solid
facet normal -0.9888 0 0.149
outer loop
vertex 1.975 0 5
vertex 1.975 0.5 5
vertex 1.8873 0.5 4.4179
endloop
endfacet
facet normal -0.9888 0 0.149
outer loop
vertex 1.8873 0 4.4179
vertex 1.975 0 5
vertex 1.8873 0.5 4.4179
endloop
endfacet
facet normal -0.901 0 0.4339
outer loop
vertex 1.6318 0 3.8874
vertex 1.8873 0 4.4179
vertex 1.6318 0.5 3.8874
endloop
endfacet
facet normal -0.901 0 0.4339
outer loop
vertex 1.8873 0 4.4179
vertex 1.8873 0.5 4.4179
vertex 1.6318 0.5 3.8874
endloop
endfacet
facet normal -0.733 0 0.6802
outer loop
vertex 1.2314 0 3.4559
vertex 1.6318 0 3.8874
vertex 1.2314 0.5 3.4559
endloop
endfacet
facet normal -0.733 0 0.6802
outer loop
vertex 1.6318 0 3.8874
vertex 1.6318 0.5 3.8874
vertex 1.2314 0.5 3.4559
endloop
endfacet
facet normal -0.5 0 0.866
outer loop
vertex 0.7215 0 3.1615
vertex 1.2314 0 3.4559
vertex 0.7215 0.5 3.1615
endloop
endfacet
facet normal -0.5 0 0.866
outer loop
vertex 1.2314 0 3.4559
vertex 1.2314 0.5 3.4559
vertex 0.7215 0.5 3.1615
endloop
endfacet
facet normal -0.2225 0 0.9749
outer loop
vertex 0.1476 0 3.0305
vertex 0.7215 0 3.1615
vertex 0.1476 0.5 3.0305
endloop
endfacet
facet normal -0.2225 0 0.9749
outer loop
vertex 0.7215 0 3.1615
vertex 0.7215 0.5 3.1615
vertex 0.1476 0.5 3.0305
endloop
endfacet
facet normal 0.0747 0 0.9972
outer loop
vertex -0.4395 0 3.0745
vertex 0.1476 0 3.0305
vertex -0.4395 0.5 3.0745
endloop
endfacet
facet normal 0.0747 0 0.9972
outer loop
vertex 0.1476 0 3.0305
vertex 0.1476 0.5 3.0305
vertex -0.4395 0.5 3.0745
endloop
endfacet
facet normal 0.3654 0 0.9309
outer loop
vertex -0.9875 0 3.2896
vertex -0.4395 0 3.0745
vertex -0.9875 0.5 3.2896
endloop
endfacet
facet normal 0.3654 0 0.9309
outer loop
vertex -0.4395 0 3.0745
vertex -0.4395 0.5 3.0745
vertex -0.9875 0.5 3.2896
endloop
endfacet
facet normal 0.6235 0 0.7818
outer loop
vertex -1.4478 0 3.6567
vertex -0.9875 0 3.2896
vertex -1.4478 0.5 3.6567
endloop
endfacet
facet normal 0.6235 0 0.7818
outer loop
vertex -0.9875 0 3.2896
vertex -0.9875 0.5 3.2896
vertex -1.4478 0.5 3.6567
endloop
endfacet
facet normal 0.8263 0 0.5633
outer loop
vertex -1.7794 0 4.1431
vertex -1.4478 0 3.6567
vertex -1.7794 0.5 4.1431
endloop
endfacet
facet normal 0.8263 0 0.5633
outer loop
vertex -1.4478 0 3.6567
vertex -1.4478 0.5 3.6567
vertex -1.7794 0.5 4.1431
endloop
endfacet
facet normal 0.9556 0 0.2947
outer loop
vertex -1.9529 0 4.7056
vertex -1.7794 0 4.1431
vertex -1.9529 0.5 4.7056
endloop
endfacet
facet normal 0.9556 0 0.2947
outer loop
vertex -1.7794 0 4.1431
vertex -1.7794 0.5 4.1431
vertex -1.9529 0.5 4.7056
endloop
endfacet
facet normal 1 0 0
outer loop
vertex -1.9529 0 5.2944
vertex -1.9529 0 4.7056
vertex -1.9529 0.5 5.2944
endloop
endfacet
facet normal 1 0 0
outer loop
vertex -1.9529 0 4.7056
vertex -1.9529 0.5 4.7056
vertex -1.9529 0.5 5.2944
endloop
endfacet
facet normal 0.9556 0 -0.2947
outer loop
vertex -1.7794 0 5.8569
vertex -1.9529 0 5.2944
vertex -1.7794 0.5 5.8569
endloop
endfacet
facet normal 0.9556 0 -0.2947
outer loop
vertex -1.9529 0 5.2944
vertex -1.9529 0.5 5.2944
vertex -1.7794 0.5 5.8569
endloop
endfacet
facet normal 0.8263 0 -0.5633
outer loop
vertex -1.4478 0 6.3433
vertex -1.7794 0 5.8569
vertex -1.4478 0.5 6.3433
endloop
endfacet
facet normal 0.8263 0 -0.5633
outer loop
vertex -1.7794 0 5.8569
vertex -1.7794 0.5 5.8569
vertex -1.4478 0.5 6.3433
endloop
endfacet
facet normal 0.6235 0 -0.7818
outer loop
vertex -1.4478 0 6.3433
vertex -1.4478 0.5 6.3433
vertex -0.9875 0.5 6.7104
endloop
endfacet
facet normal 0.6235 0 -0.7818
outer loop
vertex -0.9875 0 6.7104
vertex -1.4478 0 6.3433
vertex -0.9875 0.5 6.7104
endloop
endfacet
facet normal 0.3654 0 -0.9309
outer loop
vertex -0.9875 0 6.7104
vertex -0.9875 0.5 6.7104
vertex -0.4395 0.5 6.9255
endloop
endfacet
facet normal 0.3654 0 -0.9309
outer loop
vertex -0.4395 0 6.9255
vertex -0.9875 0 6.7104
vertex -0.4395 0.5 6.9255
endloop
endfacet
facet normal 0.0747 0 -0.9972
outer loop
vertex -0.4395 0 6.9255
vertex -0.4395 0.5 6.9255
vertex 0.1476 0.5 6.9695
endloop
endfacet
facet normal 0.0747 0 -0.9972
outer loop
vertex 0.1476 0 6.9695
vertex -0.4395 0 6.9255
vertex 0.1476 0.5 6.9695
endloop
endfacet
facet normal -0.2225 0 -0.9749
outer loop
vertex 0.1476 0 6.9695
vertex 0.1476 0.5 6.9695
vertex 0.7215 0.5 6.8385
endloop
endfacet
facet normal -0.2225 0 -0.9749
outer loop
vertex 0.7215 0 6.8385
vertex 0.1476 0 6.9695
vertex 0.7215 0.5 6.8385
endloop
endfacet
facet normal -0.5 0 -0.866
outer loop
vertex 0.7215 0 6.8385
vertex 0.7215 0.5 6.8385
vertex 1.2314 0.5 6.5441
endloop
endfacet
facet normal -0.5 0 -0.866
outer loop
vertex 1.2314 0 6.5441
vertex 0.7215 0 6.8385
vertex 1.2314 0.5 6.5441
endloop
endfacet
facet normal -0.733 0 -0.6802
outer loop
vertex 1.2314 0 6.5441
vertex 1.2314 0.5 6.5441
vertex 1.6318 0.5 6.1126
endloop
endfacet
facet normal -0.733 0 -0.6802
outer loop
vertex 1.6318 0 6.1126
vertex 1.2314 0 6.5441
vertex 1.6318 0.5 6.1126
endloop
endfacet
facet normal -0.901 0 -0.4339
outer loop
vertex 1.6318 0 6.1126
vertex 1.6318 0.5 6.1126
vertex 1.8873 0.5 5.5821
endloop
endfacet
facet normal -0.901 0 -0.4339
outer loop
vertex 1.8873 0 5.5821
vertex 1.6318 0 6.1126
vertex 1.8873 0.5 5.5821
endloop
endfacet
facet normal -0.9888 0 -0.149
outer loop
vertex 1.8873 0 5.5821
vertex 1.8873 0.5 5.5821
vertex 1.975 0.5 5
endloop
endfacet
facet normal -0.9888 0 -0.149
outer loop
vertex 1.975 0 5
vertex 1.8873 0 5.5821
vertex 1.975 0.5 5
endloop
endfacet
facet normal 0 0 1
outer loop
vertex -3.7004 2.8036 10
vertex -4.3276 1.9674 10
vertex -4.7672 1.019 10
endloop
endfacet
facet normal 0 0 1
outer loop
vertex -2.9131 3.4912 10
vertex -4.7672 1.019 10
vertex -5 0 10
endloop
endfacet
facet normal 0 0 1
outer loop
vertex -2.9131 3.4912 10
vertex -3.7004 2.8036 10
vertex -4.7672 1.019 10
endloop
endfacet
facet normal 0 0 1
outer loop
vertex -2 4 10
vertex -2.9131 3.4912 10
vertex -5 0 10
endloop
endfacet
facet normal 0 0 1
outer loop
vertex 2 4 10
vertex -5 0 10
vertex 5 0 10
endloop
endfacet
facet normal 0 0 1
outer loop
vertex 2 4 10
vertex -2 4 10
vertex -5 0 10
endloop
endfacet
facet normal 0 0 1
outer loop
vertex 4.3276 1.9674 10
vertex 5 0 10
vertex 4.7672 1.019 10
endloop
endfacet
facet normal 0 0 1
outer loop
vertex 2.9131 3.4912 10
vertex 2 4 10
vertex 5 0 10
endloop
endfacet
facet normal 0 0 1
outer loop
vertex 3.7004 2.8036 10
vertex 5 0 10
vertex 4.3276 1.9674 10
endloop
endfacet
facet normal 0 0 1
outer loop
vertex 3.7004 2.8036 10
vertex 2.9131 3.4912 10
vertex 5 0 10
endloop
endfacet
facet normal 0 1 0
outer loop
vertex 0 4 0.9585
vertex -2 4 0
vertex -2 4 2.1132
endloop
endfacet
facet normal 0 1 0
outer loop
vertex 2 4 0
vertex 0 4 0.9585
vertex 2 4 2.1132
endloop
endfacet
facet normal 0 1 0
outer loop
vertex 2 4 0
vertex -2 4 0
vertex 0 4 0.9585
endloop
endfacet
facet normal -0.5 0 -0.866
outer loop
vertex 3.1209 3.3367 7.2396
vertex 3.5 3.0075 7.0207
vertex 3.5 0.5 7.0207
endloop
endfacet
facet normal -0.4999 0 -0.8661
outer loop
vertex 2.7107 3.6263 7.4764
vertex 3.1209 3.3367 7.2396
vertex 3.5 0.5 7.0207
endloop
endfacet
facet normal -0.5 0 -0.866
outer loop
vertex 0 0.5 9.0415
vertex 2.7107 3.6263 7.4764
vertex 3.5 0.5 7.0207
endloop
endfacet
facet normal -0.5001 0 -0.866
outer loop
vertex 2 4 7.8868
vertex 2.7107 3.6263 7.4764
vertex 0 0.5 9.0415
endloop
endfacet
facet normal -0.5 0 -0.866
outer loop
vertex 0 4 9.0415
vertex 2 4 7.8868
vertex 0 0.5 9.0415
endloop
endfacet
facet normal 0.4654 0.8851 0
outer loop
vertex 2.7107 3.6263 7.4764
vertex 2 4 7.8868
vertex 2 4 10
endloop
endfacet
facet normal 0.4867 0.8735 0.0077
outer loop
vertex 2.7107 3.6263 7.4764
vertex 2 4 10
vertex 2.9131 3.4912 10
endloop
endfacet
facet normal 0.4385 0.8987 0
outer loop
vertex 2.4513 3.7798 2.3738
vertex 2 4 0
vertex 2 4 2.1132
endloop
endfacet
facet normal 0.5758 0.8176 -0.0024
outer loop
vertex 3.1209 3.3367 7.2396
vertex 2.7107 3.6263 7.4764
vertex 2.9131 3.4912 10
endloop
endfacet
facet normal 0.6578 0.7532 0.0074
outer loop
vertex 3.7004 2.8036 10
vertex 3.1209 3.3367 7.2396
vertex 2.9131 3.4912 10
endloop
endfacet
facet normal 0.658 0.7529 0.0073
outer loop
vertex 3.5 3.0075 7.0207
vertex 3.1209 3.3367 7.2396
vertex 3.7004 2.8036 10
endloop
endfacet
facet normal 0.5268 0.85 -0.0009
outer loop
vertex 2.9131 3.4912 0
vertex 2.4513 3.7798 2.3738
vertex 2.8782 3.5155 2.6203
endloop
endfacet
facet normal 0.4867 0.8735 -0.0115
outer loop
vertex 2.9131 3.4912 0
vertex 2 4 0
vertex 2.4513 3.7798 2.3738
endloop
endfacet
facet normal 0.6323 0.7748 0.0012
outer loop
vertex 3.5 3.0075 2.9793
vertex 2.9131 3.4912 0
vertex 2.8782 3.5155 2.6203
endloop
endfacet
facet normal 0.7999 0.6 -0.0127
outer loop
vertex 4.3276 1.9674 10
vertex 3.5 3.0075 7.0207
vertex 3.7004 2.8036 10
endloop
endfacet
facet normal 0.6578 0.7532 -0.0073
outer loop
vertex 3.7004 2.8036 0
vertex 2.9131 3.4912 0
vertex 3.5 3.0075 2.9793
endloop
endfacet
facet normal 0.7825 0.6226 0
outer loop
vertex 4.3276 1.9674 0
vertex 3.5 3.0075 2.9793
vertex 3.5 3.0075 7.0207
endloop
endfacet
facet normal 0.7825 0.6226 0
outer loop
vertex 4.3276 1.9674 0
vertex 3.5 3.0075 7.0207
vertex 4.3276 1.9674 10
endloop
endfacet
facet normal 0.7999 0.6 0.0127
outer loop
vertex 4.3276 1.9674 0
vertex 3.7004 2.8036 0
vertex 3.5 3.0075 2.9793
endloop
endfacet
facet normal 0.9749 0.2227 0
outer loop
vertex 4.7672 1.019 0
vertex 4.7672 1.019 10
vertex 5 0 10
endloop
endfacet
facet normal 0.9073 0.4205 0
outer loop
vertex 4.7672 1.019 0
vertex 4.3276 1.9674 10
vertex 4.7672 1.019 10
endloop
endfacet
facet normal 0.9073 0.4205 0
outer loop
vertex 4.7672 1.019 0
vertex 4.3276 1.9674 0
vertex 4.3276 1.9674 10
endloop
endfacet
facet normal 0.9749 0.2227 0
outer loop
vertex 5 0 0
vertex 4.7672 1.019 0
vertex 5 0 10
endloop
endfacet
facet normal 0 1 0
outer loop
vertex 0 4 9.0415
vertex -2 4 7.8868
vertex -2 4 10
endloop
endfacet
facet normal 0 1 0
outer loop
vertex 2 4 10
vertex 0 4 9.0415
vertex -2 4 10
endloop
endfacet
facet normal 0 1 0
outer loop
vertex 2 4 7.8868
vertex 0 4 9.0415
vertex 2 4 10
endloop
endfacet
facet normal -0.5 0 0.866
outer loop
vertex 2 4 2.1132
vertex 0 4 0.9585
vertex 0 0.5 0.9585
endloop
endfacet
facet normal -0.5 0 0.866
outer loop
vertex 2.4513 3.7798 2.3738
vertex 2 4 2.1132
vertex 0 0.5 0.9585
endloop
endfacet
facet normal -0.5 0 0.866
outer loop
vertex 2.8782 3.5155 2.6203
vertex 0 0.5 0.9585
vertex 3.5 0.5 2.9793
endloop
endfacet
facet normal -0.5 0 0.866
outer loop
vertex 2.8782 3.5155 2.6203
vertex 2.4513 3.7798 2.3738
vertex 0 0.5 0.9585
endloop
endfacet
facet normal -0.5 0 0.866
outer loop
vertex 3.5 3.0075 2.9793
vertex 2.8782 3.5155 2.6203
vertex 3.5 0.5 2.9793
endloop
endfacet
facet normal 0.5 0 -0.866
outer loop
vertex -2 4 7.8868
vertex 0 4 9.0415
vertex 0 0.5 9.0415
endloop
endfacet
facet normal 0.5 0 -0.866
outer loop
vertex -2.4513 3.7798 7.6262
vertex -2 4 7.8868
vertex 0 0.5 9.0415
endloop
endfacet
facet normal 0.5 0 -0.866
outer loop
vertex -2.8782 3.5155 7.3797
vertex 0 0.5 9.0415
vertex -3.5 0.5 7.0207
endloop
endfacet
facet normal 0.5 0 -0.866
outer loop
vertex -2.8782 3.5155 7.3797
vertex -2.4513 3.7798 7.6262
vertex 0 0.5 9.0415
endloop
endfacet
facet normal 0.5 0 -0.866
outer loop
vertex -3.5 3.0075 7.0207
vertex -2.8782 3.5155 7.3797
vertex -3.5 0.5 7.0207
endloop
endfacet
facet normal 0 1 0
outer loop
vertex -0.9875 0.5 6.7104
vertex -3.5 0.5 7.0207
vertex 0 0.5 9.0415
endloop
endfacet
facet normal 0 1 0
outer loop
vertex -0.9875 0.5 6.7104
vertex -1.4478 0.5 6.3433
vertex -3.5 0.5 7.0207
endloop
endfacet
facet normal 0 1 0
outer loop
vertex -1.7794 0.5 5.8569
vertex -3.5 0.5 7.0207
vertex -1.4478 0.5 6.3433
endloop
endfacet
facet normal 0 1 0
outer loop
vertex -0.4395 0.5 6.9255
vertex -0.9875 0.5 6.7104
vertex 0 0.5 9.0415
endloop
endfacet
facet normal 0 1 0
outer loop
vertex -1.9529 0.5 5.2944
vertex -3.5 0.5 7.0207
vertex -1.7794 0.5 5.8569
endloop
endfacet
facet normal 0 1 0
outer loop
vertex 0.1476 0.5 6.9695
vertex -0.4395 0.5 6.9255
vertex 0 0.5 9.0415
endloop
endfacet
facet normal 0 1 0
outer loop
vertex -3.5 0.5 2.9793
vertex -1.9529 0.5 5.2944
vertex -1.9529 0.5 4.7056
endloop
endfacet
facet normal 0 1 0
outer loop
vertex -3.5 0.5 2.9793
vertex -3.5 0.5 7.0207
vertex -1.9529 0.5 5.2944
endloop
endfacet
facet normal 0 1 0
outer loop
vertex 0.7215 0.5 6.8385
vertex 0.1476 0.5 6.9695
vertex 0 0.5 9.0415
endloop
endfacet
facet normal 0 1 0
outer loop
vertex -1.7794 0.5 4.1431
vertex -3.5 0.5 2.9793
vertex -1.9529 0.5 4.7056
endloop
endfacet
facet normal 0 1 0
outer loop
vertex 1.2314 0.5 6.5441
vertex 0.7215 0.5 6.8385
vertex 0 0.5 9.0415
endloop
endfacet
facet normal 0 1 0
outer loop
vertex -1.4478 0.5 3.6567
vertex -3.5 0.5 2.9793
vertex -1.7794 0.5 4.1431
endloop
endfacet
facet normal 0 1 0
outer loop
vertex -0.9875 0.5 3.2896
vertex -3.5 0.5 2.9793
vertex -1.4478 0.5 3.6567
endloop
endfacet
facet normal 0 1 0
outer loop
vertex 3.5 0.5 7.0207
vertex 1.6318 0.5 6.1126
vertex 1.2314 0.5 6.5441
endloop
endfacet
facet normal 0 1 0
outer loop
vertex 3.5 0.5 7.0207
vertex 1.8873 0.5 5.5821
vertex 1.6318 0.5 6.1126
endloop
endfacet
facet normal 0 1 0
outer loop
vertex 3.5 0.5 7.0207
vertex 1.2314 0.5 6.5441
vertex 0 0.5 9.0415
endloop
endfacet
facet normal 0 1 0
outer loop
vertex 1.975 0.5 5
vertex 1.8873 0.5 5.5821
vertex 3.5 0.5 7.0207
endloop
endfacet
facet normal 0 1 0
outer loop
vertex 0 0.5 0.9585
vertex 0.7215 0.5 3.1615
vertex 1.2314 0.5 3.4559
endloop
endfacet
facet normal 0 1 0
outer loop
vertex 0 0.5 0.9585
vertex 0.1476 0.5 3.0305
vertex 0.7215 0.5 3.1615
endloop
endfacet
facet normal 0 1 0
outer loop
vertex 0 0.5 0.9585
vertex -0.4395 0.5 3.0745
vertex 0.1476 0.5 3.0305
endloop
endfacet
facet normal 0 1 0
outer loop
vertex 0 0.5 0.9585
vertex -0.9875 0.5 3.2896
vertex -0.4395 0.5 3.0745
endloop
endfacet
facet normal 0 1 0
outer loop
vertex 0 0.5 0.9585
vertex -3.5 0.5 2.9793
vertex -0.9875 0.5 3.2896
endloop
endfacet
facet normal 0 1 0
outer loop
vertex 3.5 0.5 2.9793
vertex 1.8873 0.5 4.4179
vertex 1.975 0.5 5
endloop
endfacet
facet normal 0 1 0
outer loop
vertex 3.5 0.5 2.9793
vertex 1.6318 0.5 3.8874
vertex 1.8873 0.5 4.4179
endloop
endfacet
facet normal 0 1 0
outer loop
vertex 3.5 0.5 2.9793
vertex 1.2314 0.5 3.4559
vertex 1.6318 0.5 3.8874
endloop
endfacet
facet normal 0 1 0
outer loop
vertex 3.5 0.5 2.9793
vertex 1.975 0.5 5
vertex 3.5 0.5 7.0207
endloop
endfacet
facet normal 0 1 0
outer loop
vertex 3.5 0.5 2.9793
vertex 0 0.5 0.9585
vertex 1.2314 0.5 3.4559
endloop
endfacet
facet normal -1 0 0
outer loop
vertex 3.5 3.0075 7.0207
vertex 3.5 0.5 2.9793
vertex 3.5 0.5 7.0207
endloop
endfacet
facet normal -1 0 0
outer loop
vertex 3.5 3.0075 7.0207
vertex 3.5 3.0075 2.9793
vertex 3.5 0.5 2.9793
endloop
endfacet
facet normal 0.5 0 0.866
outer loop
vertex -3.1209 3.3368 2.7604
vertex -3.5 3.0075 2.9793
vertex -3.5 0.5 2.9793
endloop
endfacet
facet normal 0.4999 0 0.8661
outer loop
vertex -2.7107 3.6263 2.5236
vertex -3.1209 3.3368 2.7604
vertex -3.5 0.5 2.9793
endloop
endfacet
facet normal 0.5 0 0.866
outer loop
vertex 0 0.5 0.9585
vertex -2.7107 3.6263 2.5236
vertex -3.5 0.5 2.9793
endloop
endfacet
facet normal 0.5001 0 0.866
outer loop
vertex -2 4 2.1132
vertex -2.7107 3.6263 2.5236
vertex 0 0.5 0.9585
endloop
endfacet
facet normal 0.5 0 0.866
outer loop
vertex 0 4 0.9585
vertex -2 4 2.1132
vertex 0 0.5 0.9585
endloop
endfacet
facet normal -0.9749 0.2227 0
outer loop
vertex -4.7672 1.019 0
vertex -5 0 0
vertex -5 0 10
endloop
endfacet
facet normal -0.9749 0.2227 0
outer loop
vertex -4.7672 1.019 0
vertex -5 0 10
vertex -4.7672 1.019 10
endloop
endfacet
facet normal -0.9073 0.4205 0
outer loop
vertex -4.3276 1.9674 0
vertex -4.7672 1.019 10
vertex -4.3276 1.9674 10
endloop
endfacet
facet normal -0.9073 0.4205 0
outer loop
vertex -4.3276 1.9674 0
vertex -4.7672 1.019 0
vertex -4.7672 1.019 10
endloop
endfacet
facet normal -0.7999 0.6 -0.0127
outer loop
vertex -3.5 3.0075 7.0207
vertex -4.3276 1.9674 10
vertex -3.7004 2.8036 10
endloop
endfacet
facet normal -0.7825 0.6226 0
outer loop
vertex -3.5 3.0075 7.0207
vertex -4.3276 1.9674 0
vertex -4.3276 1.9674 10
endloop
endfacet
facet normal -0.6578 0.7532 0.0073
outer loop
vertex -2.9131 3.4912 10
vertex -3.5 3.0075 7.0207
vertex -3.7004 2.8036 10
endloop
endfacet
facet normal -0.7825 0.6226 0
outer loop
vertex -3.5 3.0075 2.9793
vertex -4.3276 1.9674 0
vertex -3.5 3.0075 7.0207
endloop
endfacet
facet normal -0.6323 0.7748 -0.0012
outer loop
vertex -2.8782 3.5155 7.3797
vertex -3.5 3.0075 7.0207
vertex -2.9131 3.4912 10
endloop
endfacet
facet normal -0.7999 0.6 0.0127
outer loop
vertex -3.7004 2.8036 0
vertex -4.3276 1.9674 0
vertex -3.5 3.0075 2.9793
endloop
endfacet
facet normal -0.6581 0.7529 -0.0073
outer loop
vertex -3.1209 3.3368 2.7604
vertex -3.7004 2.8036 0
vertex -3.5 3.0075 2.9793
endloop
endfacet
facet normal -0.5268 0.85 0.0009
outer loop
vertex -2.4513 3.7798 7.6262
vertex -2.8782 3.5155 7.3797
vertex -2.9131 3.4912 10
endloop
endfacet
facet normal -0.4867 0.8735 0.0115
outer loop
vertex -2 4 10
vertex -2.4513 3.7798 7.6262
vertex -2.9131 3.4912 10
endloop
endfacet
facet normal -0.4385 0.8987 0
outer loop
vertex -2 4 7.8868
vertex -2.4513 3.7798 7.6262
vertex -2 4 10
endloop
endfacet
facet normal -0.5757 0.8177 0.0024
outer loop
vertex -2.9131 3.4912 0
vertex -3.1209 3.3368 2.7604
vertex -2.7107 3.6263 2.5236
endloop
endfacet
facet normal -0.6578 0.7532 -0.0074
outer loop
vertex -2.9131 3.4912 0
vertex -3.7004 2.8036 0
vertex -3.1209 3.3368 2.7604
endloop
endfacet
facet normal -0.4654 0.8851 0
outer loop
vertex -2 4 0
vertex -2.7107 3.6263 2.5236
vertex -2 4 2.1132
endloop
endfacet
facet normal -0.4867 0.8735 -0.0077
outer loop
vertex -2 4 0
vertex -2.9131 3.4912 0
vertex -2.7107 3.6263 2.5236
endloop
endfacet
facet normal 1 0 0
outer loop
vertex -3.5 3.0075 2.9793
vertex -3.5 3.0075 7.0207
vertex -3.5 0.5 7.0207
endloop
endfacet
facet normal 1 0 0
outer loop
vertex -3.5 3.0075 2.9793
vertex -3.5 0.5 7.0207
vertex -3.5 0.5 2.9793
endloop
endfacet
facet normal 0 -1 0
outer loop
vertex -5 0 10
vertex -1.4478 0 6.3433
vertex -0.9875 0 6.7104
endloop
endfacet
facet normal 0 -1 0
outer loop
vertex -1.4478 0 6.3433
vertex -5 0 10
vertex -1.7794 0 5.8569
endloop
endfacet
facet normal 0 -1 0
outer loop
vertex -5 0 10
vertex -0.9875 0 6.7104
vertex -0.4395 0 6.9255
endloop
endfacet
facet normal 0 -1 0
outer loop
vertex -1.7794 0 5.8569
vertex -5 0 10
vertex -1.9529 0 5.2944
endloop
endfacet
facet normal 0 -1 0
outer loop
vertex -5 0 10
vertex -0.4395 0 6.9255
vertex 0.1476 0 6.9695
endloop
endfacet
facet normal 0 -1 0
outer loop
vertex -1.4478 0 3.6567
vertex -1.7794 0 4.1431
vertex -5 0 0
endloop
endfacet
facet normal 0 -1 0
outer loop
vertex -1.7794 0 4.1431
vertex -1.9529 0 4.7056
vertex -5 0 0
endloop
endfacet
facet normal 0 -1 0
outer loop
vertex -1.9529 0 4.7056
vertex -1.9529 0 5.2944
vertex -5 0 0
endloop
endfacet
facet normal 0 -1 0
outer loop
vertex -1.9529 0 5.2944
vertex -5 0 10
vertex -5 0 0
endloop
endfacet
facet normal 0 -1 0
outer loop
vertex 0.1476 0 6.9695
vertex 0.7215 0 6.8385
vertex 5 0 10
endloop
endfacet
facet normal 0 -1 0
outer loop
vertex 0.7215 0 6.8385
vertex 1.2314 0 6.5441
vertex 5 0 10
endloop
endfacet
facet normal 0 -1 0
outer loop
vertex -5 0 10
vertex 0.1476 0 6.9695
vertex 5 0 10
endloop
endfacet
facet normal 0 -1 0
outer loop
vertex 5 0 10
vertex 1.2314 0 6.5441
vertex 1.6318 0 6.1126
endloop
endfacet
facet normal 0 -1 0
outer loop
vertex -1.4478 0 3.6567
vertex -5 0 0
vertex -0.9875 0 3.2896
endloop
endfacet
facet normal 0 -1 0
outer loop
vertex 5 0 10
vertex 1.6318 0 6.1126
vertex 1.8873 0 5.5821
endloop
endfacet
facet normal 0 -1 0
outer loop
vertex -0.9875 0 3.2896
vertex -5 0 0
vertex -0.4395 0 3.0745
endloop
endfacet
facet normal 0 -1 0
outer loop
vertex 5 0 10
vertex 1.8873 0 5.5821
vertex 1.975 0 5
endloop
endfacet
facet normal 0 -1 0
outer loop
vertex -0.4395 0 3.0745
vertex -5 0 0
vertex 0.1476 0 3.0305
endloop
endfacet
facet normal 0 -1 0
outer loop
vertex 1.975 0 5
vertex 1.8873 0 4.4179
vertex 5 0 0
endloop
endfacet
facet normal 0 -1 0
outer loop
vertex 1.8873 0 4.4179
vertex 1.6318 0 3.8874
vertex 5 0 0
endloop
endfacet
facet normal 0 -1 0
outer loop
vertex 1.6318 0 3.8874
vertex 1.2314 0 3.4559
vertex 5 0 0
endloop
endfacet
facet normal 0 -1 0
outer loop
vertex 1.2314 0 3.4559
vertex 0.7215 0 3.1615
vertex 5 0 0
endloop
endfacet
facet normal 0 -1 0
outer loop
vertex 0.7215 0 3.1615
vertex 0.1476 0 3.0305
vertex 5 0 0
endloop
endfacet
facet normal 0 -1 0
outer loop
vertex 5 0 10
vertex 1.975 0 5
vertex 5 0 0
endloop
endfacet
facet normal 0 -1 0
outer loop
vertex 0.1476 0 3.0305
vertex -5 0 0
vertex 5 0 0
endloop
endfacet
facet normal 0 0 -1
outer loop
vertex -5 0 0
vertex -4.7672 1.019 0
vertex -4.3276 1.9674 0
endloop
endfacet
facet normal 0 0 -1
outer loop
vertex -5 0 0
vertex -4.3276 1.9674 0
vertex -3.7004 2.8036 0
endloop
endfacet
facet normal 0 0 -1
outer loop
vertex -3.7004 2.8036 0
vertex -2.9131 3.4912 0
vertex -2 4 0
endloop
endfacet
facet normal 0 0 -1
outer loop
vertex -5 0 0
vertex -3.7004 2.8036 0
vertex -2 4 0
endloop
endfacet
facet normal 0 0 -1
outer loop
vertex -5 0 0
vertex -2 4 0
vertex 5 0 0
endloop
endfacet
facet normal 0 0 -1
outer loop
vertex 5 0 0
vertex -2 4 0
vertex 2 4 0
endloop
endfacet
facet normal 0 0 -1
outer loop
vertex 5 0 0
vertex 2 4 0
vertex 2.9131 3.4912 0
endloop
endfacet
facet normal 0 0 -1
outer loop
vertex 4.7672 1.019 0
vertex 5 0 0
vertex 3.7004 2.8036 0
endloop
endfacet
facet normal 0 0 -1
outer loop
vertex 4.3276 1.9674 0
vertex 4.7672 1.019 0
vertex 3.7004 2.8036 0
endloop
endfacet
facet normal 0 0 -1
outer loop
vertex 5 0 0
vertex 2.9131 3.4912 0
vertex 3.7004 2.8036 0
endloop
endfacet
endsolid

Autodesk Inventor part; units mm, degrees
ref_plane "YZ Plane" through (0, 0, 0) normal (1, 0, 0) x (0, 1, 0)
ref_plane "XZ Plane" through (0, 0, 0) normal (0, 1, 0) x (-1, 0, 0)
ref_plane "XY Plane" through (0, 0, 0) normal (0, 0, 1) x (1, 0, 0)
sketch "Sketch1" plane through (0, 0, 0) normal (0, 0, 1) x (1, 0, 0)
  line L0 (-5, 0) -> (5, 0)
  line L1 (0, 0) -> (0, 4) construction
  line L2 (-2, 4) -> (2, 4)
  arc A0 (-2, 4) -> (-5, 0) centre (-0.0359, -0.5981) ccw
  arc A1 (5, 0) -> (2, 4) centre (0.0359, -0.5981) ccw
  dimension "d0" = 10
  dimension "d1" = 4
  dimension "d2" = 4
  dimension "d3" = 5
  dimension "d4" = 5
extrude "Extrusion1" add sketch "Sketch1" along normal blind 10
sketch "Sketch2" plane through (-2, 4, 0) normal (0, 1, 0) x (1, 0, 0)
  circle A0 centre (2, -5) radius 1.975
  line L0 (4, 0) -> (0, 0) projected
  line L1 (0, 0) -> (0, -10) projected
  point P0 (2, 0)
  point P1 (2, 0)
  dimension "d7" = 3.95
  dimension "d8" = 5
  dimension "d9" = 2
extrude "Extrusion2" cut sketch "Sketch2" against normal blind 10
sketch "Sketch3" plane through (-2, 4, 0) normal (0, 1, 0) x (1, 0, 0)
  point P0 (2, 0)
sketch "Sketch5" plane through (-2, 4, 0) normal (0, 1, 0) x (1, 0, 0)
  circle A0 centre (2, -5) radius 1.975 projected
  line L0 (2, -0.9585) -> (5.5, -2.9793)
  line L1 (5.5, -2.9793) -> (5.5, -7.0207)
  line L2 (5.5, -7.0207) -> (2, -9.0415)
  line L3 (2, -9.0415) -> (-1.5, -7.0207)
  line L4 (-1.5, -7.0207) -> (-1.5, -2.9793)
  line L5 (-1.5, -2.9793) -> (2, -0.9585)
  point P0 (2, 0)
  point P1 (5.5, -5)
  dimension "d15" = 3.5
extrude "Extrusion4" cut sketch "Sketch5" against normal blind 3.5
properties part number "RailNut"
